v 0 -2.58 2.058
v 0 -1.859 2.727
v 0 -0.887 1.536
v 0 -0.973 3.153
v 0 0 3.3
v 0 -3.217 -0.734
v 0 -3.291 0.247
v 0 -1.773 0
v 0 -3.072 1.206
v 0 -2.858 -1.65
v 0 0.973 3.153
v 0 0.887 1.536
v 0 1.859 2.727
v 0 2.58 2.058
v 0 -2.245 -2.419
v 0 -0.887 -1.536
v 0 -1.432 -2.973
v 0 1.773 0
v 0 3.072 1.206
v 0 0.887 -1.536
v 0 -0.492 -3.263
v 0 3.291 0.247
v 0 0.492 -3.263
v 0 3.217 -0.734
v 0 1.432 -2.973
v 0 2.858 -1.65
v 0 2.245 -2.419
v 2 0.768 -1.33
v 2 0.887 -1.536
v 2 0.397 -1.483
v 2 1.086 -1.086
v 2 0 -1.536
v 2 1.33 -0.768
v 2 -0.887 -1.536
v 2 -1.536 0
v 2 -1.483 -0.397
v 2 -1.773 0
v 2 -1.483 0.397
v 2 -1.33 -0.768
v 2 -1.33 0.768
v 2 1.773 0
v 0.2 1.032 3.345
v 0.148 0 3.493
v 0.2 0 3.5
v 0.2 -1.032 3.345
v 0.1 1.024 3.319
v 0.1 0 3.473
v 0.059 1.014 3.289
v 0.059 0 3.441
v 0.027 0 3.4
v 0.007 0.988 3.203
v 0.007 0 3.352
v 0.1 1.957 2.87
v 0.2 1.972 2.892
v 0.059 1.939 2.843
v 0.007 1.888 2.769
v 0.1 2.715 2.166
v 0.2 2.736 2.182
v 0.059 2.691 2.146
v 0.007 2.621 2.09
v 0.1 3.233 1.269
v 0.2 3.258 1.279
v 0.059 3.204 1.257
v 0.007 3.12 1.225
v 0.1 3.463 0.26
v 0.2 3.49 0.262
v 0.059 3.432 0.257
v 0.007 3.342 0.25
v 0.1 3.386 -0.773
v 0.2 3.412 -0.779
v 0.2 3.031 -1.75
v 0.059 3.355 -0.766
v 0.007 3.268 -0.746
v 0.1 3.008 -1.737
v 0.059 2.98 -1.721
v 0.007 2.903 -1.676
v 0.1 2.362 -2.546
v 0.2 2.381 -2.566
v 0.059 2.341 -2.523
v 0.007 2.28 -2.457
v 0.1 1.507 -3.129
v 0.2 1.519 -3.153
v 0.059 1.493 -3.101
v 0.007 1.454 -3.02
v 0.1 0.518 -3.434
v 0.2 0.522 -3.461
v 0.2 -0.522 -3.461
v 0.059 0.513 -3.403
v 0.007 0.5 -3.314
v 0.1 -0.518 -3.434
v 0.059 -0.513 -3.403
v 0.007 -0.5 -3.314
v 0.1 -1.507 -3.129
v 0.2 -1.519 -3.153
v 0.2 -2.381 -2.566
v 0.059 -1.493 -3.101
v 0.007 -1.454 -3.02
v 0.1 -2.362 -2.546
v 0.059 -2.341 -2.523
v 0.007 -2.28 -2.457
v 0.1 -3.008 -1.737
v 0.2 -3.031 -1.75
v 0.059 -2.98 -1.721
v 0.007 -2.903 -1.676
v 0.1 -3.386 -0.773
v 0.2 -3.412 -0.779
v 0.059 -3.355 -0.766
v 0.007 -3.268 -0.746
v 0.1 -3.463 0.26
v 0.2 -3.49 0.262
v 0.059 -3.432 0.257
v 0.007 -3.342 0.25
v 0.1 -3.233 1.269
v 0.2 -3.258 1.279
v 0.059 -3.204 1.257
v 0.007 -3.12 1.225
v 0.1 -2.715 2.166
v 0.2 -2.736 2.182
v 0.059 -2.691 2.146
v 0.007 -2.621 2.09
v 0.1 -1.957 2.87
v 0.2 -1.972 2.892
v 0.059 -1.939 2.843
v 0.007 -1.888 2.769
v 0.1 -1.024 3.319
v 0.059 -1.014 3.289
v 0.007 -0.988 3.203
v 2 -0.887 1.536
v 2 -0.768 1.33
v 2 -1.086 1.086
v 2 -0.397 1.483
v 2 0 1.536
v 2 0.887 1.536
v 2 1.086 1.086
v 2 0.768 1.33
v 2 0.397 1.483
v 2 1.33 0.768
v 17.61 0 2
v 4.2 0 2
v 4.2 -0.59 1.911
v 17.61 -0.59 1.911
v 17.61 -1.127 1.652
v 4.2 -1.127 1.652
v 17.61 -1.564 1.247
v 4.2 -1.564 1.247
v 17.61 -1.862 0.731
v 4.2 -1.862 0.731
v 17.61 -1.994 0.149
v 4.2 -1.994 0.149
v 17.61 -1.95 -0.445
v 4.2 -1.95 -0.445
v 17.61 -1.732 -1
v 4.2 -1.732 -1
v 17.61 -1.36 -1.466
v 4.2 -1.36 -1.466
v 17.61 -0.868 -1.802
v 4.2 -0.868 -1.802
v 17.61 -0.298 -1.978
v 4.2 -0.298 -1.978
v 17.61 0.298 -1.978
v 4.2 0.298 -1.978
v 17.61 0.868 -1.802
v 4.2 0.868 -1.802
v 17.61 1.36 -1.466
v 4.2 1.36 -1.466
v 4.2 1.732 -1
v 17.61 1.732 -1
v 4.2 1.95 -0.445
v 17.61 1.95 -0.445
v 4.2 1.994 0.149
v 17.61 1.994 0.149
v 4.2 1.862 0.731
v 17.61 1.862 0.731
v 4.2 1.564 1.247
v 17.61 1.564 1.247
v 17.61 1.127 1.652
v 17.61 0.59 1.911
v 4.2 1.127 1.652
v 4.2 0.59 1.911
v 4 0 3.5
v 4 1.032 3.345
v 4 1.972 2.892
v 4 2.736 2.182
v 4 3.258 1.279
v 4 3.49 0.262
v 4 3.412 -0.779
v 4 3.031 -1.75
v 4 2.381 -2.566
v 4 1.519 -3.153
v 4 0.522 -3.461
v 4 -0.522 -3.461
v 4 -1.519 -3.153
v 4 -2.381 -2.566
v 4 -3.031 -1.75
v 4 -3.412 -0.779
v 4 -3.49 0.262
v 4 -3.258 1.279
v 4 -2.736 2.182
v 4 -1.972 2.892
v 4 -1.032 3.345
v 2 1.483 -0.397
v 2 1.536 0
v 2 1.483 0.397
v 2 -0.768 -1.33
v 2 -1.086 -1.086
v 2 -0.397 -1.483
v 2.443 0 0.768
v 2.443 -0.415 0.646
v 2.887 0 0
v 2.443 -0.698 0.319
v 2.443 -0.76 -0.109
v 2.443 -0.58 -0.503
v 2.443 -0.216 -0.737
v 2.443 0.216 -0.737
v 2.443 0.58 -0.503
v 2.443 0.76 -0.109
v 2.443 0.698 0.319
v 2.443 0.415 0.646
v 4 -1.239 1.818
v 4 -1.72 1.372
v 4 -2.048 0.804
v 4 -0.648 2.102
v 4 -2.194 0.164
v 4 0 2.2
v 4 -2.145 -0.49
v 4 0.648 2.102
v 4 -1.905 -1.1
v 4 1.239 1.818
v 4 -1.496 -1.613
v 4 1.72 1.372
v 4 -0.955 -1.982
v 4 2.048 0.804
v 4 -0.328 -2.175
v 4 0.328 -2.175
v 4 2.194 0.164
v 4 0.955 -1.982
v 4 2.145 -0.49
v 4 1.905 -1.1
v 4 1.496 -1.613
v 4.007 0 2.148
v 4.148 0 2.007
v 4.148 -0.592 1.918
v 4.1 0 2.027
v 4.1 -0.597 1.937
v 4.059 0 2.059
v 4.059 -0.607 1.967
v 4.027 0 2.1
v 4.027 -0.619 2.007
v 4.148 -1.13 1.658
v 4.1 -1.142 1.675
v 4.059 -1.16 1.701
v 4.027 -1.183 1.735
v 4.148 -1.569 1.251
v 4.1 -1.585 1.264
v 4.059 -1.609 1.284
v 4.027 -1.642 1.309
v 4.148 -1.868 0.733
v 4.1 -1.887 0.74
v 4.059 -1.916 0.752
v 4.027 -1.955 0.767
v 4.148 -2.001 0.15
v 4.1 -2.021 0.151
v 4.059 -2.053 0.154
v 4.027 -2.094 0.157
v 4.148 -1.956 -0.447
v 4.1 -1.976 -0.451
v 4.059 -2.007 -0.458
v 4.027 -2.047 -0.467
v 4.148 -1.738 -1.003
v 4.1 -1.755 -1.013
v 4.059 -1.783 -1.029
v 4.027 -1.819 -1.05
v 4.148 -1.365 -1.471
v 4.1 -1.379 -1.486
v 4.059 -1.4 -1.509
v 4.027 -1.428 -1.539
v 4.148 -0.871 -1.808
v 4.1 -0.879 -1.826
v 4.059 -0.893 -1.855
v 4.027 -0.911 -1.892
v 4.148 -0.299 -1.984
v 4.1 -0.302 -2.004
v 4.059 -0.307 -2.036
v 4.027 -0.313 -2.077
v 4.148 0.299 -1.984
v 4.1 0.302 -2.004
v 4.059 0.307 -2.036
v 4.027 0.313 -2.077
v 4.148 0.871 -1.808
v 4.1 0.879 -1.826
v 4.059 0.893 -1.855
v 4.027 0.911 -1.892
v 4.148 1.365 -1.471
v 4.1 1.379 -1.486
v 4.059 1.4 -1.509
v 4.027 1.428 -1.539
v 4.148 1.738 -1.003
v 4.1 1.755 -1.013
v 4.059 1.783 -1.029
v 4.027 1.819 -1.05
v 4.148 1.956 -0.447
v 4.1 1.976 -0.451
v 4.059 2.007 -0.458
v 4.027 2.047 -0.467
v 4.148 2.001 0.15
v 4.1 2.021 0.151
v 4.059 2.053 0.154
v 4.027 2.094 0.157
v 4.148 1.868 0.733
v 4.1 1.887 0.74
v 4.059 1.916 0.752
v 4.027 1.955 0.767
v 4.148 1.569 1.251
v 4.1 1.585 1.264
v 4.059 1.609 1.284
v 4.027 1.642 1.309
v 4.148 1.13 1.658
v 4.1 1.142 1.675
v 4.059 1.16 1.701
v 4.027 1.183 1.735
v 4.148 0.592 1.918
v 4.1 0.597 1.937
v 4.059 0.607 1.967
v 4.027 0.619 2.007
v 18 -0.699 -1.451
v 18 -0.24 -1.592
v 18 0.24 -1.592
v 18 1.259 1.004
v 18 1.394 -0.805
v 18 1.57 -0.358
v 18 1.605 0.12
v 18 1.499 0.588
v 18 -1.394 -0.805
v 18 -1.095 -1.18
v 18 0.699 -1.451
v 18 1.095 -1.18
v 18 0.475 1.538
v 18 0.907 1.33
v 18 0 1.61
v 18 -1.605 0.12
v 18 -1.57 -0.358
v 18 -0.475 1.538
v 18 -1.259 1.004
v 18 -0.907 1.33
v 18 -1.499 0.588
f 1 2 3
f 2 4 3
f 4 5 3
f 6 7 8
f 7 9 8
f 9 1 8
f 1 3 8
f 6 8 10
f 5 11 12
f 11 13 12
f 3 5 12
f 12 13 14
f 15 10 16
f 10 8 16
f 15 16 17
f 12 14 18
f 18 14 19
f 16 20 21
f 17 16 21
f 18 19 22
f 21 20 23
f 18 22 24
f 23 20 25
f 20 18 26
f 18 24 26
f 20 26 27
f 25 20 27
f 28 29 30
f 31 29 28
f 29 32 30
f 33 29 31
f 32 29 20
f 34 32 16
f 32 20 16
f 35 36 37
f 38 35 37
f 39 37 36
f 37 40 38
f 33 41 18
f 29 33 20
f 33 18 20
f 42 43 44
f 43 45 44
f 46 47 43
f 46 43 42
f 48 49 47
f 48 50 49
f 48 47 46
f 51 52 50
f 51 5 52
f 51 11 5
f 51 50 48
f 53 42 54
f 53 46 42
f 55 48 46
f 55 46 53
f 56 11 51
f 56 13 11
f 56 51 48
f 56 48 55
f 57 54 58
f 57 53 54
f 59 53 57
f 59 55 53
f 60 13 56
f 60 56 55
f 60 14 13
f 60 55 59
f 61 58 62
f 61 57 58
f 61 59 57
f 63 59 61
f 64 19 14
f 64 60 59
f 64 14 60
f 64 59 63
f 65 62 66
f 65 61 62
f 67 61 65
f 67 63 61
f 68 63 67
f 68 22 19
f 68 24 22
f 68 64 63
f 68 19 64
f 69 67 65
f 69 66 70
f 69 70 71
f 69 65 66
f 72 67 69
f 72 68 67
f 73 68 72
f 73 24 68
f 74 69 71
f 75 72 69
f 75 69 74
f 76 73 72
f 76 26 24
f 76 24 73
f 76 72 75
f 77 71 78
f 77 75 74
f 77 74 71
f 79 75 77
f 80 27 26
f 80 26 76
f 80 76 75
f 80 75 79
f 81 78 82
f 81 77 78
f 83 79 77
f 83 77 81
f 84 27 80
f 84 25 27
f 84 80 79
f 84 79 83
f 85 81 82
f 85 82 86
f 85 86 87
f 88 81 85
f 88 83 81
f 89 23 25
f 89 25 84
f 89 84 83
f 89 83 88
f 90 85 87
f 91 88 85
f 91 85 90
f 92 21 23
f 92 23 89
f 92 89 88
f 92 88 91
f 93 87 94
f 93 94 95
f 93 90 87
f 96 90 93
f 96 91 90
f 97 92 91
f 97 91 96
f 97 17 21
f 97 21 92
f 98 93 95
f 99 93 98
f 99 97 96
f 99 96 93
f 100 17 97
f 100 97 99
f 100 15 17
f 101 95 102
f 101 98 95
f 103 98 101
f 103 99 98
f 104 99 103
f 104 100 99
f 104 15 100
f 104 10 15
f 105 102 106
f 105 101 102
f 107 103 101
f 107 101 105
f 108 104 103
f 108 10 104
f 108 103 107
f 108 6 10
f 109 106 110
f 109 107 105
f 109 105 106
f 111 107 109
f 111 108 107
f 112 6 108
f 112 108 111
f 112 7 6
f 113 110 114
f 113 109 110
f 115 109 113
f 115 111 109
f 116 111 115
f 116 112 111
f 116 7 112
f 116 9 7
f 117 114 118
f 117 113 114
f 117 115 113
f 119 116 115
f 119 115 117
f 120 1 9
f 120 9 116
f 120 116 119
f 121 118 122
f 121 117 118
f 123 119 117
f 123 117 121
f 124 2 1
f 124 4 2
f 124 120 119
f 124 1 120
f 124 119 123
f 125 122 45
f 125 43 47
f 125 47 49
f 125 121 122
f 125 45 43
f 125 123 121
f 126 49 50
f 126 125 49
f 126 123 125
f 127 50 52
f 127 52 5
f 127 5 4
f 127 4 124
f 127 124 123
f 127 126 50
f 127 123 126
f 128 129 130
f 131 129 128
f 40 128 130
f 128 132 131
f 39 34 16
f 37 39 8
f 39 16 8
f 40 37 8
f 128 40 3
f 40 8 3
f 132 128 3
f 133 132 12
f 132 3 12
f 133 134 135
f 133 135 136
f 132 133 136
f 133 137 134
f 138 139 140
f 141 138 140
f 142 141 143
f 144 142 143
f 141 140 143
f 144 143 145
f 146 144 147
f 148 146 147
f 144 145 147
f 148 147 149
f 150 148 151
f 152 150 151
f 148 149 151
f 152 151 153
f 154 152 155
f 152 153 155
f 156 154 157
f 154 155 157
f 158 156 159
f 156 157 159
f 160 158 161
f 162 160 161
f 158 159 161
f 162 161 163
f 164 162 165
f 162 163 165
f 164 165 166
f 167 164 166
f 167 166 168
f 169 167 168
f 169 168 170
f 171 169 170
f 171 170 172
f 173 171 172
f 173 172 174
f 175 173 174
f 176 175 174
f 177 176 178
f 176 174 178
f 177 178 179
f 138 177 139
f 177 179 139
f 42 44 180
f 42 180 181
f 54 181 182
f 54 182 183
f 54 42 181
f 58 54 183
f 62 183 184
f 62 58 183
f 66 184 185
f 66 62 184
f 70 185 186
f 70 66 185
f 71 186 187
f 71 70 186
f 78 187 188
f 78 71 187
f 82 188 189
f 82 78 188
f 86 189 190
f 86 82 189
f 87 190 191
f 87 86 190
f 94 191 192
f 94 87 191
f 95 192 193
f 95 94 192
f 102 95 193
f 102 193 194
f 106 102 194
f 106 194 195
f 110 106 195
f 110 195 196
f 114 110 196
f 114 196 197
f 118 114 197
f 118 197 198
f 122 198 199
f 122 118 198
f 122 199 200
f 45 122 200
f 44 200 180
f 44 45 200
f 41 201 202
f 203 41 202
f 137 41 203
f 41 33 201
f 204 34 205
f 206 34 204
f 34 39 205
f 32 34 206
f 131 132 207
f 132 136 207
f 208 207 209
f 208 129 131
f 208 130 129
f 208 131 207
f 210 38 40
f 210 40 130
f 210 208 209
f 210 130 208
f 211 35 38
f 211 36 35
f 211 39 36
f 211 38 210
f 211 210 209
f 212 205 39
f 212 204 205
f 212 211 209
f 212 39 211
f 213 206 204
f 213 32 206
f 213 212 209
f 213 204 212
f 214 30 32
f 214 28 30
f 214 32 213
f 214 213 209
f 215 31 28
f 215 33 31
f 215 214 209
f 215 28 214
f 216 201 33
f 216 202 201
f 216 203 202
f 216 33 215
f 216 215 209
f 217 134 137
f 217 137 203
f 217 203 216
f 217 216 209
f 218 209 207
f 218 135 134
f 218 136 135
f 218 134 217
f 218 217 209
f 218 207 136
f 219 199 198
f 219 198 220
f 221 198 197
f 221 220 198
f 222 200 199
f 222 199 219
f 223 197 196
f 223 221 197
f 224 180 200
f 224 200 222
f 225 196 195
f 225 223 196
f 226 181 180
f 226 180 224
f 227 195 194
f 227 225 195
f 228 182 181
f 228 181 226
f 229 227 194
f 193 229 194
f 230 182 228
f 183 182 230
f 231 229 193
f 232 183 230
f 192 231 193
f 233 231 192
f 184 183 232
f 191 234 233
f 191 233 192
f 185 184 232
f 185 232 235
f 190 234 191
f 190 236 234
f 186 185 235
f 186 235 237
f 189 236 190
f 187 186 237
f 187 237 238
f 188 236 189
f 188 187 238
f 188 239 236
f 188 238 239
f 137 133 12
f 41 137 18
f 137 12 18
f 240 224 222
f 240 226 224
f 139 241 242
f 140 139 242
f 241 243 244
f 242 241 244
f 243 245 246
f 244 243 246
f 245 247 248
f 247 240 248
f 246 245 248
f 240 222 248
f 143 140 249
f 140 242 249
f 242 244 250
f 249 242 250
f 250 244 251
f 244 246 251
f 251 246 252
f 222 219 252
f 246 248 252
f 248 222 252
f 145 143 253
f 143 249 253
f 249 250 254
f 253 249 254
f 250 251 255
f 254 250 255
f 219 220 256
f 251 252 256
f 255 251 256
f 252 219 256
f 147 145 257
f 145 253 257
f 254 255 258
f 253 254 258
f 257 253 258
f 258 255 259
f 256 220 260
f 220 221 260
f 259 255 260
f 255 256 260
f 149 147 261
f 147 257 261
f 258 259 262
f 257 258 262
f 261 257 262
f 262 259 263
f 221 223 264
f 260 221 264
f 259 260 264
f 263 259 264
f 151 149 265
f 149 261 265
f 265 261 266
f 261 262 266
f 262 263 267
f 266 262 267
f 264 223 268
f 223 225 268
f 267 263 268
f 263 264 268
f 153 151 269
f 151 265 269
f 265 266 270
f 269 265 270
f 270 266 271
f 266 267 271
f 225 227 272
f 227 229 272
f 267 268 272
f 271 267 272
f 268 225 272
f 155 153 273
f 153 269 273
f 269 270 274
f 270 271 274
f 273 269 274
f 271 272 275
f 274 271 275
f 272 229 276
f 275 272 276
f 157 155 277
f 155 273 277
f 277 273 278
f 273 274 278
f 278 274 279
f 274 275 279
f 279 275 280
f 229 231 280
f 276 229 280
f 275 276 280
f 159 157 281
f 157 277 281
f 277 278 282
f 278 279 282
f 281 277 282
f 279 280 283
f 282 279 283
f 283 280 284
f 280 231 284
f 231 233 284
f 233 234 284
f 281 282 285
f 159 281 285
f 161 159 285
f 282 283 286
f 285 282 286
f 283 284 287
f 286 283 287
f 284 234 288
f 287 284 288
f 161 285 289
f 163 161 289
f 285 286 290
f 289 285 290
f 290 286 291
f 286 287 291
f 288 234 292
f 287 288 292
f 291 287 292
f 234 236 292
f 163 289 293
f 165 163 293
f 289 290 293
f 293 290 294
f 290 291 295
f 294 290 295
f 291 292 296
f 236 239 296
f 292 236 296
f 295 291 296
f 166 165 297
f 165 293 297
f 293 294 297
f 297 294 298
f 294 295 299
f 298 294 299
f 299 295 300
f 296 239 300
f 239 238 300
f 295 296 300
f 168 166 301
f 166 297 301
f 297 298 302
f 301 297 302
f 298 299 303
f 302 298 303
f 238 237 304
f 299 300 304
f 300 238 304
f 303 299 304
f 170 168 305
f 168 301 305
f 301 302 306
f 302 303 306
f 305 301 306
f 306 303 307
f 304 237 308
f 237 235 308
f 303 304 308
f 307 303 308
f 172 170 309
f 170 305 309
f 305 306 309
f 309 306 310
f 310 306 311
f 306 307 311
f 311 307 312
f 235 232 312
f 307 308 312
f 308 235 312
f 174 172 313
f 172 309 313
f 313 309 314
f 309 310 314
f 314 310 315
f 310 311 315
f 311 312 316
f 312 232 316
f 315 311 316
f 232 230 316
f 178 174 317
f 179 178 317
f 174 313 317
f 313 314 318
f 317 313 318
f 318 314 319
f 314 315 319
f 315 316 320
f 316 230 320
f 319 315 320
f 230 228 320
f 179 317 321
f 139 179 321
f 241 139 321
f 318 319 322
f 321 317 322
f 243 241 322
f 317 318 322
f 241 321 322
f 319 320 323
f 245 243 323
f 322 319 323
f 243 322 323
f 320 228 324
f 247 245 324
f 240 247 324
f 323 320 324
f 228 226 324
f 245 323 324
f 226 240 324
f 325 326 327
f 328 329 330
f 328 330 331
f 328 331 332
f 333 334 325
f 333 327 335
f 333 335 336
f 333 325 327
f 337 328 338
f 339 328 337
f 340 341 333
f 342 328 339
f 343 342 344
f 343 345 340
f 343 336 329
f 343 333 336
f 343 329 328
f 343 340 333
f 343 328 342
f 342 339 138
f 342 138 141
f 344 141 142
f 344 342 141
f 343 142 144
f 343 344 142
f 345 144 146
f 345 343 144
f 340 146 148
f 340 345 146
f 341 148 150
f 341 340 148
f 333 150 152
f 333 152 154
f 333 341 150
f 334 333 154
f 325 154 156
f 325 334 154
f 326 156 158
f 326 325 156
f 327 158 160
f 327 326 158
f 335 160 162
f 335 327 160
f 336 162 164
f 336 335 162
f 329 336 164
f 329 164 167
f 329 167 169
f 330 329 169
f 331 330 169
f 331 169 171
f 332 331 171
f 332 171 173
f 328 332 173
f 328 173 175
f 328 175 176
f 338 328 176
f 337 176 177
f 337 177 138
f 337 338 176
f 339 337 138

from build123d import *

# Parameters (mm, degrees)
ESQUISSE1_W             = 4
ESQUISSE1_H             = 3.5
ESQUISSE2_R             = 2
BOSS_EXTRU_1_DEPTH      = 14
ENL_V_MAT_EXTRU_1_DEPTH = 2
CHANFREIN1_SIZE         = 0.39
CONG_1_R                = 0.2


with BuildPart() as part:
    # Esquisse1 → Révolution1 (revolve)
    with BuildSketch(Plane(origin=(0, 0, 0), x_dir=(-1, 0, 0), z_dir=(0, 0, -1)), mode=Mode.PRIVATE) as r_volution1_sk:
        with Locations((-2, 1.75)):
            Rectangle(ESQUISSE1_W, ESQUISSE1_H)
    revolve(r_volution1_sk.sketch.rotate(Axis((4, 0, 0), (-1, 0, 0)), 270), axis=Axis((4, 0, 0), (-1, 0, 0)))

    # Esquisse2 → Boss.-Extru.1 (add)
    with BuildSketch(Plane(origin=(4, 0, 0), x_dir=(0, 0, -1), z_dir=(1, 0, 0))):
        with Locations(Location((0, 0, 0), (0, 0, 180))):
            Circle(ESQUISSE2_R)
    extrude(amount=BOSS_EXTRU_1_DEPTH)

    # Esquisse3 → Enlèv. mat.-Extru.1 (cut)
    with BuildSketch(Plane.ZY):
        Polygon((0, -1.773042677), (1.5355, -0.886521338), (1.5355, 0.886521338), (0, 1.773042677), (-1.5355, 0.886521338), (-1.5355, -0.886521338), align=None)
    extrude(amount=-ENL_V_MAT_EXTRU_1_DEPTH, mode=Mode.SUBTRACT)

    # Esquisse4 → Enlèvement de matière-Révolution1 (revolve, cut)
    with BuildSketch(Plane.XY, mode=Mode.PRIVATE) as enl_vement_de_mati_re_r_volution1_sk:
        Polygon((2, 1.5355), (2, 0), (2.886521338, 0), align=None)
    revolve(enl_vement_de_mati_re_r_volution1_sk.sketch.rotate(Axis((2, 0, 0), (1, 0, 0)), 90), axis=Axis((2, 0, 0), (1, 0, 0)), mode=Mode.SUBTRACT)

    # Chanfrein1
    chanfrein1_edges = [part.edges().sort_by_distance(p)[0] for p in [
        (18, 0, -2),
    ]]
    chamfer(chanfrein1_edges, length=CHANFREIN1_SIZE)

    # Congé1
    cong_1_edges = [part.edges().sort_by_distance(p)[0] for p in [
        (0, 0, -3.5),
        (4, 0, -2),
    ]]
    fillet(cong_1_edges, radius=CONG_1_R)


solid = part.part
